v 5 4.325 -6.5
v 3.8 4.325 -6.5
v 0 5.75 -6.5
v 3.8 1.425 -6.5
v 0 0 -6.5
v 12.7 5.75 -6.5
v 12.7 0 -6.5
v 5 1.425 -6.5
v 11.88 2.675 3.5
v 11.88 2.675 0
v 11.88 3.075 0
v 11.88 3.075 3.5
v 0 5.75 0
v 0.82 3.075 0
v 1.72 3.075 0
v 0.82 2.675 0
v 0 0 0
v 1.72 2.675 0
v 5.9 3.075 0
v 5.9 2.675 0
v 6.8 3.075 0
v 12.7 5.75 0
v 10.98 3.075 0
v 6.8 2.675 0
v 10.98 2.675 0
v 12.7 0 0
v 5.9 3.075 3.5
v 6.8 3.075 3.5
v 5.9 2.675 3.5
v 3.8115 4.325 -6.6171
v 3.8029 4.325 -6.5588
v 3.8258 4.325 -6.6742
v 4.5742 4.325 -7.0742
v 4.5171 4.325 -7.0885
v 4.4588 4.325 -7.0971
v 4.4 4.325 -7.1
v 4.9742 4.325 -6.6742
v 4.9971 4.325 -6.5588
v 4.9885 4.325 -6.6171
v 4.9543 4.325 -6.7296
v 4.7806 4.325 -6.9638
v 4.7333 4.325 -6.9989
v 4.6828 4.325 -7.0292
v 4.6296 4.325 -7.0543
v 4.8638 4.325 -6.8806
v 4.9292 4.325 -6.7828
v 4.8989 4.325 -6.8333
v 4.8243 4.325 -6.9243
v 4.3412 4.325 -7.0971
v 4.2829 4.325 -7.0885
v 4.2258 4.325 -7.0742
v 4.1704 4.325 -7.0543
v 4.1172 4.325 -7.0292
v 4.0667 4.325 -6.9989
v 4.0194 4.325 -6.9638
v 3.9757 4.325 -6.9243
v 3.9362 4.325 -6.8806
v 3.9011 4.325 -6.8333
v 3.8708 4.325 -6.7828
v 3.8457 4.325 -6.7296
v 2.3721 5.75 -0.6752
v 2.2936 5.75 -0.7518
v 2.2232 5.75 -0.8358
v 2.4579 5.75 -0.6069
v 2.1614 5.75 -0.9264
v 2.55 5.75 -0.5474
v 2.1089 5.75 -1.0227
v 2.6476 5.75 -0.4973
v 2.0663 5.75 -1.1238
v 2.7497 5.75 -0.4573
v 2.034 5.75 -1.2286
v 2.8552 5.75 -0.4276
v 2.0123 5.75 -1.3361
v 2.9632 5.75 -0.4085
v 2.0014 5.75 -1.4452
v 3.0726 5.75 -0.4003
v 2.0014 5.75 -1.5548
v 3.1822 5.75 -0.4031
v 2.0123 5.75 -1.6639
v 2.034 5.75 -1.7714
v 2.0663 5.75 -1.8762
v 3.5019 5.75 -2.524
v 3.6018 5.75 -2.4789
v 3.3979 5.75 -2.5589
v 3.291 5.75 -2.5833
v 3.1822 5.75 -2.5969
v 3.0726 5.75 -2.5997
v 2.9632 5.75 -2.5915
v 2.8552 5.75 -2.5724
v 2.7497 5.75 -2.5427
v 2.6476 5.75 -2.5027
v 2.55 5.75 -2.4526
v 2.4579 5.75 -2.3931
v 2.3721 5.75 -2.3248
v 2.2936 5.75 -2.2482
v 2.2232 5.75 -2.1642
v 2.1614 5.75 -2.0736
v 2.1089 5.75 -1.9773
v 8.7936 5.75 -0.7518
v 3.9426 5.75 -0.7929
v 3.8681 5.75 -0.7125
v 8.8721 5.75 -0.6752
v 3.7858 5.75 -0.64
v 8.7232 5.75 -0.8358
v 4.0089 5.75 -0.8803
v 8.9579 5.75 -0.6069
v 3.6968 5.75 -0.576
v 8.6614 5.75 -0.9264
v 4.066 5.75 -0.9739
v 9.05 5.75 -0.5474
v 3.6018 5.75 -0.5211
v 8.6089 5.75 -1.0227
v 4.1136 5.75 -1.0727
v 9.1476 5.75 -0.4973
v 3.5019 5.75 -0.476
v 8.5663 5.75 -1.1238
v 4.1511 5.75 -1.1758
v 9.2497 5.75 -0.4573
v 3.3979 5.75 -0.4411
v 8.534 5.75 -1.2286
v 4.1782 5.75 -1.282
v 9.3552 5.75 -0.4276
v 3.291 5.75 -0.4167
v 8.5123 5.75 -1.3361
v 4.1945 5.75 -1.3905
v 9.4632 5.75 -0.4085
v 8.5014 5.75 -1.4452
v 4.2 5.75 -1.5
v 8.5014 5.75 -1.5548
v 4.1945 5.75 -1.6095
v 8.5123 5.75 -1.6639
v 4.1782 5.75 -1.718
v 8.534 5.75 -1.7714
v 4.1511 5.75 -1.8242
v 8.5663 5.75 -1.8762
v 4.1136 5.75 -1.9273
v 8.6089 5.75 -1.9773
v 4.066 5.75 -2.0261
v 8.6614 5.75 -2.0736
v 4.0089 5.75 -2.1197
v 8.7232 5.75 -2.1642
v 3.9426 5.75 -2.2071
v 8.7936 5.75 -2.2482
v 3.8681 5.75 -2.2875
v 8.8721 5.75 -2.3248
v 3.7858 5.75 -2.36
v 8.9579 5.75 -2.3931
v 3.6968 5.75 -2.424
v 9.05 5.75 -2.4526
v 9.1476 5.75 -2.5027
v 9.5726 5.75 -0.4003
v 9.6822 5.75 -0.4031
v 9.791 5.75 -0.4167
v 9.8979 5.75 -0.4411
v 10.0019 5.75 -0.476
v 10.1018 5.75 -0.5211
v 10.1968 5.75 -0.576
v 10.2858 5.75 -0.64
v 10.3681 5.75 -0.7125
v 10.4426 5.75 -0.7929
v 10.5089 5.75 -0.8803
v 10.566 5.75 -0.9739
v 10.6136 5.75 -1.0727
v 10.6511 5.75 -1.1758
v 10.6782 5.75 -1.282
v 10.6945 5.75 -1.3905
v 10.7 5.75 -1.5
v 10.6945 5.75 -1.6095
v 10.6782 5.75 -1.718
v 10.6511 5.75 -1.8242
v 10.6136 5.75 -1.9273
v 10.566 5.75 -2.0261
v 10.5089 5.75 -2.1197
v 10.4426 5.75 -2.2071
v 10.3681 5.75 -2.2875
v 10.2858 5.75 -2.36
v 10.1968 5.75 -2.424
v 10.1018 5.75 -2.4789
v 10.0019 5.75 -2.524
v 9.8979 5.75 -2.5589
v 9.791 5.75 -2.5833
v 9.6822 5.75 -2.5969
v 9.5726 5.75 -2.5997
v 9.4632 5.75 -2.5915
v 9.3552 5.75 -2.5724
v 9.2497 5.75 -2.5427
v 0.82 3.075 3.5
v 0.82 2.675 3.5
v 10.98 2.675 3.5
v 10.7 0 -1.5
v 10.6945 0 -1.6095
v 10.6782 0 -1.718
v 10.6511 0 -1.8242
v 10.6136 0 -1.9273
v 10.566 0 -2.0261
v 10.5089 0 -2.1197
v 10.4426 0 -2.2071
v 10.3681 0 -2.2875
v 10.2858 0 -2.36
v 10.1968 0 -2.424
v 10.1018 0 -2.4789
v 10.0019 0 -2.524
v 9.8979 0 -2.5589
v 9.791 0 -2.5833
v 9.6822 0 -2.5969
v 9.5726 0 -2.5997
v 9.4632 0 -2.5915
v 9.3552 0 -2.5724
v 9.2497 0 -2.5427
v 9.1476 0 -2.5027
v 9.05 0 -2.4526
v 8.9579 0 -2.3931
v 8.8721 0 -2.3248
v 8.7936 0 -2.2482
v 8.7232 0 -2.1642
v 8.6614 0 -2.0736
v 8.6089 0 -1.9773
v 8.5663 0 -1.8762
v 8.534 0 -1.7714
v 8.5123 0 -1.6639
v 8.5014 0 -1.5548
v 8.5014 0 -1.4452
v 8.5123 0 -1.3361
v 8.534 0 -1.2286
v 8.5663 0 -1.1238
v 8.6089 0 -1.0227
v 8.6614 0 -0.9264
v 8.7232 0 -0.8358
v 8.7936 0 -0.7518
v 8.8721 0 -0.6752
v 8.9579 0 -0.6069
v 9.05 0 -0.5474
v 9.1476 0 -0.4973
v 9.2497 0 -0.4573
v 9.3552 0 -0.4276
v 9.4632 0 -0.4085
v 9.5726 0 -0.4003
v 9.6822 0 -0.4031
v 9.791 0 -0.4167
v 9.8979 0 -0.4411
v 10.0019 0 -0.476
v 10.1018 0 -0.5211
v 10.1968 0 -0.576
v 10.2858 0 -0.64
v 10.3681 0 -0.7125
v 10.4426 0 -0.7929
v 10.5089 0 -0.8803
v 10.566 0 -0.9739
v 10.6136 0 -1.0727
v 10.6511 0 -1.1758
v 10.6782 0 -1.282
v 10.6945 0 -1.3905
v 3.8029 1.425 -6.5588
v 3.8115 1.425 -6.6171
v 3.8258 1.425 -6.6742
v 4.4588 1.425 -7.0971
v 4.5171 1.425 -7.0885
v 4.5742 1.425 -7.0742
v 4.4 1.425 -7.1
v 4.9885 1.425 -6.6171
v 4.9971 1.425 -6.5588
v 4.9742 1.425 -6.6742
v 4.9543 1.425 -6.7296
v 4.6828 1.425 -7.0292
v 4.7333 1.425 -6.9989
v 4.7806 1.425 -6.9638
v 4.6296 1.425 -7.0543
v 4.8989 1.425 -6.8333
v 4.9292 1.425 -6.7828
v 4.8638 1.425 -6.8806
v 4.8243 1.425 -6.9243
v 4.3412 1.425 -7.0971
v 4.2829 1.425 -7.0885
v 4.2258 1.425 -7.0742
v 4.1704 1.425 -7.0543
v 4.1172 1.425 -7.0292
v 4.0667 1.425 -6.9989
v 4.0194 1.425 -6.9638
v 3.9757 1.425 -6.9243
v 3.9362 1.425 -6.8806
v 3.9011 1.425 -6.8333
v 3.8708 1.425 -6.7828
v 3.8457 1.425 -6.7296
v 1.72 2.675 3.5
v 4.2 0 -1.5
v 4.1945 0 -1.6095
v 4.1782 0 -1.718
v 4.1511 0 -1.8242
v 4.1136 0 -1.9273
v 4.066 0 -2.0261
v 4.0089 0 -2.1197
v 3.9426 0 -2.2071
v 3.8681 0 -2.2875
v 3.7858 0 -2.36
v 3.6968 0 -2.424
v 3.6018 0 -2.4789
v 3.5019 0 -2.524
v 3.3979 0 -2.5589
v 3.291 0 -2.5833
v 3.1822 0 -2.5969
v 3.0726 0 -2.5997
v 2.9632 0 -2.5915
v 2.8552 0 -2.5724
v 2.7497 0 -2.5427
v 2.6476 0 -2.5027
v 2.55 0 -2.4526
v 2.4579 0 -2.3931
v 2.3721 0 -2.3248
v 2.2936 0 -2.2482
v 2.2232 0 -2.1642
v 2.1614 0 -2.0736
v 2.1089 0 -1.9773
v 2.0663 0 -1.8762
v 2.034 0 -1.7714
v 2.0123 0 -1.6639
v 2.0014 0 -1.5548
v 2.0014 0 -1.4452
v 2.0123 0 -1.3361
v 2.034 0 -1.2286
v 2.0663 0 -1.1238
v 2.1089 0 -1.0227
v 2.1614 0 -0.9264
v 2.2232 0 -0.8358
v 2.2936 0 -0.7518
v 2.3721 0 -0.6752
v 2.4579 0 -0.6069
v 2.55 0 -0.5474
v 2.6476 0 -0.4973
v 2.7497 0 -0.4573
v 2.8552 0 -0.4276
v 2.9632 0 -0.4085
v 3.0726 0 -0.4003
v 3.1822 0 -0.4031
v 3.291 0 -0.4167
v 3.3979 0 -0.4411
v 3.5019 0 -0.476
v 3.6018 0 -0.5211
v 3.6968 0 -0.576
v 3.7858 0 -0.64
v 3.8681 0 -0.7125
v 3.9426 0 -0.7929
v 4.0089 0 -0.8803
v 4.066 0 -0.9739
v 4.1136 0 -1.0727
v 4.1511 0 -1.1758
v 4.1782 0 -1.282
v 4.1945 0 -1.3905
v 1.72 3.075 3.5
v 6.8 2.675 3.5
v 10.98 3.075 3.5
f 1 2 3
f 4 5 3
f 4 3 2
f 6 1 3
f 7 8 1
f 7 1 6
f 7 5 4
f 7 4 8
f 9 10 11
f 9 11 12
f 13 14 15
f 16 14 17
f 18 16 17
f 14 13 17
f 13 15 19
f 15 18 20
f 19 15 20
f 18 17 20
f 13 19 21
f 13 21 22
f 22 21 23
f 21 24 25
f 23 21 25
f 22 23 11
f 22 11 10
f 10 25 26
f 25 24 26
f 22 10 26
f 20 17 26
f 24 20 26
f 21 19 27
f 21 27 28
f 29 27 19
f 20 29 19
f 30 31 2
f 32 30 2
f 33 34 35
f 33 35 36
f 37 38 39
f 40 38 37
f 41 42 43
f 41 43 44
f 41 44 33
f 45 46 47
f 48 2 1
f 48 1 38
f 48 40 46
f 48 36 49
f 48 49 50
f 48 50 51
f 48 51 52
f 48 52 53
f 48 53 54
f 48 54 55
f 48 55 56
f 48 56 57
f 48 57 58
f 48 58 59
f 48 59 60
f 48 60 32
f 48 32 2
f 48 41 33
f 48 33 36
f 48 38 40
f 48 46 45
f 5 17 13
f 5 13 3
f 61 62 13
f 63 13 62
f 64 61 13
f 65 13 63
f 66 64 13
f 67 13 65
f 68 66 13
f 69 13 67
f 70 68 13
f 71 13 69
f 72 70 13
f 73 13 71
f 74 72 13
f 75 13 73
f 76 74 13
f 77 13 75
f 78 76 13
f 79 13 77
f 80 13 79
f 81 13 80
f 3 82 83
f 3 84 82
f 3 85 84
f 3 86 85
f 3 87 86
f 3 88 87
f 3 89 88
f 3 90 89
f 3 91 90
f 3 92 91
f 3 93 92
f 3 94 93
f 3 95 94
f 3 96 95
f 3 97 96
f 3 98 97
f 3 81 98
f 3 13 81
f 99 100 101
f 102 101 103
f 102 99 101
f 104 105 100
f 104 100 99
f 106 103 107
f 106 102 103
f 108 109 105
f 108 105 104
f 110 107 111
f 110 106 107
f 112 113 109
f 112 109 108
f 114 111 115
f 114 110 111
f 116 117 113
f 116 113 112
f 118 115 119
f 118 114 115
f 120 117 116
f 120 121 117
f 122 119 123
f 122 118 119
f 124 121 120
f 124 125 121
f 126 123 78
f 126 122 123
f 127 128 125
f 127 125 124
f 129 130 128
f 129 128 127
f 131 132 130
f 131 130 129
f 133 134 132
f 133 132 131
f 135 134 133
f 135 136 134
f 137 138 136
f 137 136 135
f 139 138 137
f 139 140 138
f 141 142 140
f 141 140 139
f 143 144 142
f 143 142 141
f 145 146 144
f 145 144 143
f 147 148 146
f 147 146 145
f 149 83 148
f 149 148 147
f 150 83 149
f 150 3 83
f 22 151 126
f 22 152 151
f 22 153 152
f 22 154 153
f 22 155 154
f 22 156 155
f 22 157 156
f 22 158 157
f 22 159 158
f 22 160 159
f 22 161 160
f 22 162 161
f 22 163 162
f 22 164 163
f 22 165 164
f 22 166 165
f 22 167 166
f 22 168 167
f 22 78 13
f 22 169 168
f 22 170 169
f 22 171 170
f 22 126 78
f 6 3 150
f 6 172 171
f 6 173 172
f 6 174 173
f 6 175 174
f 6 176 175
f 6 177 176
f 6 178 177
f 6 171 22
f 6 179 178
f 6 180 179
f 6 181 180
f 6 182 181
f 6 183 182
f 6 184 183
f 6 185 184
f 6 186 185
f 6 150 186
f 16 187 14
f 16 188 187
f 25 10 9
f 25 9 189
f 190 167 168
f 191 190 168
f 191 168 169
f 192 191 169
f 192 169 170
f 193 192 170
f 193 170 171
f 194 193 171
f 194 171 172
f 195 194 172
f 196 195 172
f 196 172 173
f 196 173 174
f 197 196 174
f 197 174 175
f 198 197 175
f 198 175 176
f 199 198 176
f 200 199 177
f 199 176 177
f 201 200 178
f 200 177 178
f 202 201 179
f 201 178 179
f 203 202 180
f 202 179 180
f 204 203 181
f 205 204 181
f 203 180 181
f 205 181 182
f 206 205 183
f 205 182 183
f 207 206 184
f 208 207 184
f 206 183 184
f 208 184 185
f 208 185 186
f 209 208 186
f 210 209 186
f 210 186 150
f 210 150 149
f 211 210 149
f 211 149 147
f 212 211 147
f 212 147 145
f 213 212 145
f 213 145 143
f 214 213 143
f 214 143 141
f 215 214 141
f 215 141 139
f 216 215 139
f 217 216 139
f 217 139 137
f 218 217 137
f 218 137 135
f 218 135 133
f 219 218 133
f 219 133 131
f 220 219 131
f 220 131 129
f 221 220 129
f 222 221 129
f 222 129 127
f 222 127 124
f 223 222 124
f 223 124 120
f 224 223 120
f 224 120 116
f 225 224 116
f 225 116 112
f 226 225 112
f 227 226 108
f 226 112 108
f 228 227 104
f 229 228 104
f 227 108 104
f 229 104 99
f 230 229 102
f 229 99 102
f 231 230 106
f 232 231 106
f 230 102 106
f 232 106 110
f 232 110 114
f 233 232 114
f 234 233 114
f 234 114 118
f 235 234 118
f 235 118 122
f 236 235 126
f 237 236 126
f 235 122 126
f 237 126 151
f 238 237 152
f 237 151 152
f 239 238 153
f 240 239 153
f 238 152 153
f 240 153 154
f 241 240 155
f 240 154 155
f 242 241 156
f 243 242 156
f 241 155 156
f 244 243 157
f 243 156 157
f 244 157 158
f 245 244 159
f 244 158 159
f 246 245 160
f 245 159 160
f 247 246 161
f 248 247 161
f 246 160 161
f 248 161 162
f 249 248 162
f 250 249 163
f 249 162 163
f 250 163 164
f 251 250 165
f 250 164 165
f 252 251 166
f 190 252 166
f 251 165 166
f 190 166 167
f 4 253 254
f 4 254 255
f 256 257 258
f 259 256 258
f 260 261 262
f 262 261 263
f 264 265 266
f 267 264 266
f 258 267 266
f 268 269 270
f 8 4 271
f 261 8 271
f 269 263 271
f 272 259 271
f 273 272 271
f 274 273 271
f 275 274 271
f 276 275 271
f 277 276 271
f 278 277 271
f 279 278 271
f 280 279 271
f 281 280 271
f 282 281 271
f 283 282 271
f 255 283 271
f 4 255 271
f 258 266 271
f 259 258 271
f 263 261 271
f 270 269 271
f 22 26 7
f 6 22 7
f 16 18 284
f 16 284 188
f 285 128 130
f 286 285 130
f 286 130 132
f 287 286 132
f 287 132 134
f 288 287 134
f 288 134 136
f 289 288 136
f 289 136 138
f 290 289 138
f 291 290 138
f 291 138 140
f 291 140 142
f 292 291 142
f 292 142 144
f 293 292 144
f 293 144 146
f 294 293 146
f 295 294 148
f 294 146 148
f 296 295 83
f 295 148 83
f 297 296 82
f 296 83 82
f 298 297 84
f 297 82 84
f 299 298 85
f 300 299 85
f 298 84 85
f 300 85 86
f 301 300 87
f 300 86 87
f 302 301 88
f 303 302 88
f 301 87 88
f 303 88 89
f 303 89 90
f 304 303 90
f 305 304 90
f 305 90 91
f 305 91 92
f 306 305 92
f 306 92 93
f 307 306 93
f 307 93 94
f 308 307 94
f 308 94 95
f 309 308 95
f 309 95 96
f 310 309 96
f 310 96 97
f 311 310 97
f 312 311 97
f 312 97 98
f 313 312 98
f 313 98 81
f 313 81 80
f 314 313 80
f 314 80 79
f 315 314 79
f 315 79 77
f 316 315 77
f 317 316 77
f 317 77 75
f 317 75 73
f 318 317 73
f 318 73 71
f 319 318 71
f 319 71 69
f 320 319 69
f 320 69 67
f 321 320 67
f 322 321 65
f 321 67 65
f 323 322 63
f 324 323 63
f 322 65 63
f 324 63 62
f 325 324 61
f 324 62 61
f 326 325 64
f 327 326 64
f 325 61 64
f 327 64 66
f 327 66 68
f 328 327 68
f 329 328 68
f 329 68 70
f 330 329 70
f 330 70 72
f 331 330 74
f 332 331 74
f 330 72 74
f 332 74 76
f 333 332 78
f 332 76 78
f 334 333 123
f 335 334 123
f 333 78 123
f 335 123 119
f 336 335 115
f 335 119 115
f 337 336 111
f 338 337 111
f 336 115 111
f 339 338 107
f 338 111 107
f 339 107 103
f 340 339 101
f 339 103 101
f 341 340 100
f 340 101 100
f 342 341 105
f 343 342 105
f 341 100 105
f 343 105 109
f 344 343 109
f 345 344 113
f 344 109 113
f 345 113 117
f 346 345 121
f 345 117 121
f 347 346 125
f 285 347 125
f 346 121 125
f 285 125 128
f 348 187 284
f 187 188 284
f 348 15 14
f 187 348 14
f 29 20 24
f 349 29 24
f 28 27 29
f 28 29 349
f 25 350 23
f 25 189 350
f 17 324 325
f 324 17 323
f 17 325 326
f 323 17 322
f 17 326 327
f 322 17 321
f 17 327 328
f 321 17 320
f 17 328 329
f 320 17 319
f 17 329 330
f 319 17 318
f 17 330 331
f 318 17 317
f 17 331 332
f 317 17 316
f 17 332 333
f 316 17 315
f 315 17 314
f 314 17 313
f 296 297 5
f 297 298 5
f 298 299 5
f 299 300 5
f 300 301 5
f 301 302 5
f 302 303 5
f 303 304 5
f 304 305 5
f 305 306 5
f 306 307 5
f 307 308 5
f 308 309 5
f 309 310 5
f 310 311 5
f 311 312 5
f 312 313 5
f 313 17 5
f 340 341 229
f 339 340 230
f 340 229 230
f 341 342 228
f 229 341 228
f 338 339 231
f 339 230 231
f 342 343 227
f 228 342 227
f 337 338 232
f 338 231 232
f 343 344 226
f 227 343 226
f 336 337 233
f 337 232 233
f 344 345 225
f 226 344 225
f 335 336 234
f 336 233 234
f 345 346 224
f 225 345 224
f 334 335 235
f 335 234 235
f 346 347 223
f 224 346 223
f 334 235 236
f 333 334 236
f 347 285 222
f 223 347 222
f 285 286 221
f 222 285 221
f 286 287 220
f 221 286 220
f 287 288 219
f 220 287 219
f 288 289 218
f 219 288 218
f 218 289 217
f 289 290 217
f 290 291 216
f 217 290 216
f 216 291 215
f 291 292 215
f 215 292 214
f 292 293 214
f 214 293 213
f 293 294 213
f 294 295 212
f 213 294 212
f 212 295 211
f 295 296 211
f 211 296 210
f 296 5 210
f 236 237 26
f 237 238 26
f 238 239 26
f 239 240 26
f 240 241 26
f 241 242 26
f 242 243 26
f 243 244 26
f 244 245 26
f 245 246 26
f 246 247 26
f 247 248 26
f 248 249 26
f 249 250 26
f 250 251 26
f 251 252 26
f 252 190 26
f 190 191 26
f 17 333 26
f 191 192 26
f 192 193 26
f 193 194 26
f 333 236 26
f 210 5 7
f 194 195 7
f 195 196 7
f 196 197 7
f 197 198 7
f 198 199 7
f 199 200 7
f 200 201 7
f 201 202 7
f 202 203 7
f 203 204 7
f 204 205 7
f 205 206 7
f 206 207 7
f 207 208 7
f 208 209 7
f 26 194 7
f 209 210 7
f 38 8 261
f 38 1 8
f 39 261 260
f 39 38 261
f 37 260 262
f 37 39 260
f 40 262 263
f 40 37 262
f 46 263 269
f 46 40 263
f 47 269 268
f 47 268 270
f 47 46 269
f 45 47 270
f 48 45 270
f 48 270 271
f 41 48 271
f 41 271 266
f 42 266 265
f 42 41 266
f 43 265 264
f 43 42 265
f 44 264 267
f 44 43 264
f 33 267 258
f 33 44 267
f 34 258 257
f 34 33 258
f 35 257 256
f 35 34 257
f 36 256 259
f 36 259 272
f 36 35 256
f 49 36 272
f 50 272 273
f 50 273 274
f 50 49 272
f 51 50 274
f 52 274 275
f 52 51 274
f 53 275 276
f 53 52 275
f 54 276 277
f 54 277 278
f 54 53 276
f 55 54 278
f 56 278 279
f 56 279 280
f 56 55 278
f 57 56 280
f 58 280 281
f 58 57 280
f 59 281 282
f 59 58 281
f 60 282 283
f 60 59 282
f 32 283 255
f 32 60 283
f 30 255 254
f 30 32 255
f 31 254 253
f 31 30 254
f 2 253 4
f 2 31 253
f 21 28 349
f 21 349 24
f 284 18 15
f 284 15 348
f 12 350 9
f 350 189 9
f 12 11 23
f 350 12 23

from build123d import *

# Parameters (mm, degrees)
SKETCH1_W                = 12.7
SKETCH1_H                = 6.5
BOSS_EXTRUDE1_DEPTH      = 5.75
SKETCH2_R                = 1.1
CUT_EXTRUDE1_DEPTH       = 6.75
SKETCH3_W                = 0.9
SKETCH3_H                = 3.5
BOSS_EXTRUDE2_DEPTH      = 0.2
BOSS_EXTRUDE2_DEPTH_BACK = 0.2
BOSS_EXTRUDE3_DEPTH      = 1.45
BOSS_EXTRUDE3_DEPTH_BACK = 1.45


with BuildPart() as part:
    # Sketch1 → Boss-Extrude1 (new body)
    with BuildSketch(Plane(origin=(0, 0, 0), x_dir=(1, 0, 0), z_dir=(0, 1, 0))):
        with Locations((6.35, 3.25)):
            Rectangle(SKETCH1_W, SKETCH1_H)
    extrude(amount=BOSS_EXTRUDE1_DEPTH)

    # Sketch2 → Cut-Extrude1 (cut, through all)
    with BuildSketch(Plane(origin=(0, 5.75, 0), x_dir=(1, 0, 0), z_dir=(0, 1, 0))):
        with Locations((3.1, 1.5)):
            Circle(SKETCH2_R)
        with Locations((9.6, 1.5)):
            Circle(SKETCH2_R)
    extrude(amount=-CUT_EXTRUDE1_DEPTH, mode=Mode.SUBTRACT)

    # Sketch3 → Boss-Extrude2 (add, two sides)
    with BuildSketch(Plane(origin=(0, 2.875, 0), x_dir=(1, 0, 0), z_dir=(0, 1, 0))) as boss_extrude2_sk:
        with Locations((6.35, -1.75)):
            Rectangle(SKETCH3_W, SKETCH3_H)
        Polygon((11.88, 0), (11.88, -3.5), (11.43, -3.5), (10.98, -3.5), (10.98, 0), align=None)
        Polygon((0.82, 0), (1.72, 0), (1.72, -3.5), (1.27, -3.5), (0.82, -3.5), align=None)
    extrude(amount=BOSS_EXTRUDE2_DEPTH)
    extrude(boss_extrude2_sk.sketch, amount=-BOSS_EXTRUDE2_DEPTH_BACK)

    # Sketch4 → Boss-Extrude3 (add, two sides)
    with BuildSketch(Plane(origin=(0, 2.875, 0), x_dir=(1, 0, 0), z_dir=(0, 1, 0))) as boss_extrude3_sk:
        with BuildLine():
            Line((3.8, 6.5), (5, 6.5))
            ThreePointArc((5, 6.5), (4.4, 7.1), (3.8, 6.5))
        make_face()
    extrude(amount=BOSS_EXTRUDE3_DEPTH)
    extrude(boss_extrude3_sk.sketch, amount=-BOSS_EXTRUDE3_DEPTH_BACK)


solid = part.part
